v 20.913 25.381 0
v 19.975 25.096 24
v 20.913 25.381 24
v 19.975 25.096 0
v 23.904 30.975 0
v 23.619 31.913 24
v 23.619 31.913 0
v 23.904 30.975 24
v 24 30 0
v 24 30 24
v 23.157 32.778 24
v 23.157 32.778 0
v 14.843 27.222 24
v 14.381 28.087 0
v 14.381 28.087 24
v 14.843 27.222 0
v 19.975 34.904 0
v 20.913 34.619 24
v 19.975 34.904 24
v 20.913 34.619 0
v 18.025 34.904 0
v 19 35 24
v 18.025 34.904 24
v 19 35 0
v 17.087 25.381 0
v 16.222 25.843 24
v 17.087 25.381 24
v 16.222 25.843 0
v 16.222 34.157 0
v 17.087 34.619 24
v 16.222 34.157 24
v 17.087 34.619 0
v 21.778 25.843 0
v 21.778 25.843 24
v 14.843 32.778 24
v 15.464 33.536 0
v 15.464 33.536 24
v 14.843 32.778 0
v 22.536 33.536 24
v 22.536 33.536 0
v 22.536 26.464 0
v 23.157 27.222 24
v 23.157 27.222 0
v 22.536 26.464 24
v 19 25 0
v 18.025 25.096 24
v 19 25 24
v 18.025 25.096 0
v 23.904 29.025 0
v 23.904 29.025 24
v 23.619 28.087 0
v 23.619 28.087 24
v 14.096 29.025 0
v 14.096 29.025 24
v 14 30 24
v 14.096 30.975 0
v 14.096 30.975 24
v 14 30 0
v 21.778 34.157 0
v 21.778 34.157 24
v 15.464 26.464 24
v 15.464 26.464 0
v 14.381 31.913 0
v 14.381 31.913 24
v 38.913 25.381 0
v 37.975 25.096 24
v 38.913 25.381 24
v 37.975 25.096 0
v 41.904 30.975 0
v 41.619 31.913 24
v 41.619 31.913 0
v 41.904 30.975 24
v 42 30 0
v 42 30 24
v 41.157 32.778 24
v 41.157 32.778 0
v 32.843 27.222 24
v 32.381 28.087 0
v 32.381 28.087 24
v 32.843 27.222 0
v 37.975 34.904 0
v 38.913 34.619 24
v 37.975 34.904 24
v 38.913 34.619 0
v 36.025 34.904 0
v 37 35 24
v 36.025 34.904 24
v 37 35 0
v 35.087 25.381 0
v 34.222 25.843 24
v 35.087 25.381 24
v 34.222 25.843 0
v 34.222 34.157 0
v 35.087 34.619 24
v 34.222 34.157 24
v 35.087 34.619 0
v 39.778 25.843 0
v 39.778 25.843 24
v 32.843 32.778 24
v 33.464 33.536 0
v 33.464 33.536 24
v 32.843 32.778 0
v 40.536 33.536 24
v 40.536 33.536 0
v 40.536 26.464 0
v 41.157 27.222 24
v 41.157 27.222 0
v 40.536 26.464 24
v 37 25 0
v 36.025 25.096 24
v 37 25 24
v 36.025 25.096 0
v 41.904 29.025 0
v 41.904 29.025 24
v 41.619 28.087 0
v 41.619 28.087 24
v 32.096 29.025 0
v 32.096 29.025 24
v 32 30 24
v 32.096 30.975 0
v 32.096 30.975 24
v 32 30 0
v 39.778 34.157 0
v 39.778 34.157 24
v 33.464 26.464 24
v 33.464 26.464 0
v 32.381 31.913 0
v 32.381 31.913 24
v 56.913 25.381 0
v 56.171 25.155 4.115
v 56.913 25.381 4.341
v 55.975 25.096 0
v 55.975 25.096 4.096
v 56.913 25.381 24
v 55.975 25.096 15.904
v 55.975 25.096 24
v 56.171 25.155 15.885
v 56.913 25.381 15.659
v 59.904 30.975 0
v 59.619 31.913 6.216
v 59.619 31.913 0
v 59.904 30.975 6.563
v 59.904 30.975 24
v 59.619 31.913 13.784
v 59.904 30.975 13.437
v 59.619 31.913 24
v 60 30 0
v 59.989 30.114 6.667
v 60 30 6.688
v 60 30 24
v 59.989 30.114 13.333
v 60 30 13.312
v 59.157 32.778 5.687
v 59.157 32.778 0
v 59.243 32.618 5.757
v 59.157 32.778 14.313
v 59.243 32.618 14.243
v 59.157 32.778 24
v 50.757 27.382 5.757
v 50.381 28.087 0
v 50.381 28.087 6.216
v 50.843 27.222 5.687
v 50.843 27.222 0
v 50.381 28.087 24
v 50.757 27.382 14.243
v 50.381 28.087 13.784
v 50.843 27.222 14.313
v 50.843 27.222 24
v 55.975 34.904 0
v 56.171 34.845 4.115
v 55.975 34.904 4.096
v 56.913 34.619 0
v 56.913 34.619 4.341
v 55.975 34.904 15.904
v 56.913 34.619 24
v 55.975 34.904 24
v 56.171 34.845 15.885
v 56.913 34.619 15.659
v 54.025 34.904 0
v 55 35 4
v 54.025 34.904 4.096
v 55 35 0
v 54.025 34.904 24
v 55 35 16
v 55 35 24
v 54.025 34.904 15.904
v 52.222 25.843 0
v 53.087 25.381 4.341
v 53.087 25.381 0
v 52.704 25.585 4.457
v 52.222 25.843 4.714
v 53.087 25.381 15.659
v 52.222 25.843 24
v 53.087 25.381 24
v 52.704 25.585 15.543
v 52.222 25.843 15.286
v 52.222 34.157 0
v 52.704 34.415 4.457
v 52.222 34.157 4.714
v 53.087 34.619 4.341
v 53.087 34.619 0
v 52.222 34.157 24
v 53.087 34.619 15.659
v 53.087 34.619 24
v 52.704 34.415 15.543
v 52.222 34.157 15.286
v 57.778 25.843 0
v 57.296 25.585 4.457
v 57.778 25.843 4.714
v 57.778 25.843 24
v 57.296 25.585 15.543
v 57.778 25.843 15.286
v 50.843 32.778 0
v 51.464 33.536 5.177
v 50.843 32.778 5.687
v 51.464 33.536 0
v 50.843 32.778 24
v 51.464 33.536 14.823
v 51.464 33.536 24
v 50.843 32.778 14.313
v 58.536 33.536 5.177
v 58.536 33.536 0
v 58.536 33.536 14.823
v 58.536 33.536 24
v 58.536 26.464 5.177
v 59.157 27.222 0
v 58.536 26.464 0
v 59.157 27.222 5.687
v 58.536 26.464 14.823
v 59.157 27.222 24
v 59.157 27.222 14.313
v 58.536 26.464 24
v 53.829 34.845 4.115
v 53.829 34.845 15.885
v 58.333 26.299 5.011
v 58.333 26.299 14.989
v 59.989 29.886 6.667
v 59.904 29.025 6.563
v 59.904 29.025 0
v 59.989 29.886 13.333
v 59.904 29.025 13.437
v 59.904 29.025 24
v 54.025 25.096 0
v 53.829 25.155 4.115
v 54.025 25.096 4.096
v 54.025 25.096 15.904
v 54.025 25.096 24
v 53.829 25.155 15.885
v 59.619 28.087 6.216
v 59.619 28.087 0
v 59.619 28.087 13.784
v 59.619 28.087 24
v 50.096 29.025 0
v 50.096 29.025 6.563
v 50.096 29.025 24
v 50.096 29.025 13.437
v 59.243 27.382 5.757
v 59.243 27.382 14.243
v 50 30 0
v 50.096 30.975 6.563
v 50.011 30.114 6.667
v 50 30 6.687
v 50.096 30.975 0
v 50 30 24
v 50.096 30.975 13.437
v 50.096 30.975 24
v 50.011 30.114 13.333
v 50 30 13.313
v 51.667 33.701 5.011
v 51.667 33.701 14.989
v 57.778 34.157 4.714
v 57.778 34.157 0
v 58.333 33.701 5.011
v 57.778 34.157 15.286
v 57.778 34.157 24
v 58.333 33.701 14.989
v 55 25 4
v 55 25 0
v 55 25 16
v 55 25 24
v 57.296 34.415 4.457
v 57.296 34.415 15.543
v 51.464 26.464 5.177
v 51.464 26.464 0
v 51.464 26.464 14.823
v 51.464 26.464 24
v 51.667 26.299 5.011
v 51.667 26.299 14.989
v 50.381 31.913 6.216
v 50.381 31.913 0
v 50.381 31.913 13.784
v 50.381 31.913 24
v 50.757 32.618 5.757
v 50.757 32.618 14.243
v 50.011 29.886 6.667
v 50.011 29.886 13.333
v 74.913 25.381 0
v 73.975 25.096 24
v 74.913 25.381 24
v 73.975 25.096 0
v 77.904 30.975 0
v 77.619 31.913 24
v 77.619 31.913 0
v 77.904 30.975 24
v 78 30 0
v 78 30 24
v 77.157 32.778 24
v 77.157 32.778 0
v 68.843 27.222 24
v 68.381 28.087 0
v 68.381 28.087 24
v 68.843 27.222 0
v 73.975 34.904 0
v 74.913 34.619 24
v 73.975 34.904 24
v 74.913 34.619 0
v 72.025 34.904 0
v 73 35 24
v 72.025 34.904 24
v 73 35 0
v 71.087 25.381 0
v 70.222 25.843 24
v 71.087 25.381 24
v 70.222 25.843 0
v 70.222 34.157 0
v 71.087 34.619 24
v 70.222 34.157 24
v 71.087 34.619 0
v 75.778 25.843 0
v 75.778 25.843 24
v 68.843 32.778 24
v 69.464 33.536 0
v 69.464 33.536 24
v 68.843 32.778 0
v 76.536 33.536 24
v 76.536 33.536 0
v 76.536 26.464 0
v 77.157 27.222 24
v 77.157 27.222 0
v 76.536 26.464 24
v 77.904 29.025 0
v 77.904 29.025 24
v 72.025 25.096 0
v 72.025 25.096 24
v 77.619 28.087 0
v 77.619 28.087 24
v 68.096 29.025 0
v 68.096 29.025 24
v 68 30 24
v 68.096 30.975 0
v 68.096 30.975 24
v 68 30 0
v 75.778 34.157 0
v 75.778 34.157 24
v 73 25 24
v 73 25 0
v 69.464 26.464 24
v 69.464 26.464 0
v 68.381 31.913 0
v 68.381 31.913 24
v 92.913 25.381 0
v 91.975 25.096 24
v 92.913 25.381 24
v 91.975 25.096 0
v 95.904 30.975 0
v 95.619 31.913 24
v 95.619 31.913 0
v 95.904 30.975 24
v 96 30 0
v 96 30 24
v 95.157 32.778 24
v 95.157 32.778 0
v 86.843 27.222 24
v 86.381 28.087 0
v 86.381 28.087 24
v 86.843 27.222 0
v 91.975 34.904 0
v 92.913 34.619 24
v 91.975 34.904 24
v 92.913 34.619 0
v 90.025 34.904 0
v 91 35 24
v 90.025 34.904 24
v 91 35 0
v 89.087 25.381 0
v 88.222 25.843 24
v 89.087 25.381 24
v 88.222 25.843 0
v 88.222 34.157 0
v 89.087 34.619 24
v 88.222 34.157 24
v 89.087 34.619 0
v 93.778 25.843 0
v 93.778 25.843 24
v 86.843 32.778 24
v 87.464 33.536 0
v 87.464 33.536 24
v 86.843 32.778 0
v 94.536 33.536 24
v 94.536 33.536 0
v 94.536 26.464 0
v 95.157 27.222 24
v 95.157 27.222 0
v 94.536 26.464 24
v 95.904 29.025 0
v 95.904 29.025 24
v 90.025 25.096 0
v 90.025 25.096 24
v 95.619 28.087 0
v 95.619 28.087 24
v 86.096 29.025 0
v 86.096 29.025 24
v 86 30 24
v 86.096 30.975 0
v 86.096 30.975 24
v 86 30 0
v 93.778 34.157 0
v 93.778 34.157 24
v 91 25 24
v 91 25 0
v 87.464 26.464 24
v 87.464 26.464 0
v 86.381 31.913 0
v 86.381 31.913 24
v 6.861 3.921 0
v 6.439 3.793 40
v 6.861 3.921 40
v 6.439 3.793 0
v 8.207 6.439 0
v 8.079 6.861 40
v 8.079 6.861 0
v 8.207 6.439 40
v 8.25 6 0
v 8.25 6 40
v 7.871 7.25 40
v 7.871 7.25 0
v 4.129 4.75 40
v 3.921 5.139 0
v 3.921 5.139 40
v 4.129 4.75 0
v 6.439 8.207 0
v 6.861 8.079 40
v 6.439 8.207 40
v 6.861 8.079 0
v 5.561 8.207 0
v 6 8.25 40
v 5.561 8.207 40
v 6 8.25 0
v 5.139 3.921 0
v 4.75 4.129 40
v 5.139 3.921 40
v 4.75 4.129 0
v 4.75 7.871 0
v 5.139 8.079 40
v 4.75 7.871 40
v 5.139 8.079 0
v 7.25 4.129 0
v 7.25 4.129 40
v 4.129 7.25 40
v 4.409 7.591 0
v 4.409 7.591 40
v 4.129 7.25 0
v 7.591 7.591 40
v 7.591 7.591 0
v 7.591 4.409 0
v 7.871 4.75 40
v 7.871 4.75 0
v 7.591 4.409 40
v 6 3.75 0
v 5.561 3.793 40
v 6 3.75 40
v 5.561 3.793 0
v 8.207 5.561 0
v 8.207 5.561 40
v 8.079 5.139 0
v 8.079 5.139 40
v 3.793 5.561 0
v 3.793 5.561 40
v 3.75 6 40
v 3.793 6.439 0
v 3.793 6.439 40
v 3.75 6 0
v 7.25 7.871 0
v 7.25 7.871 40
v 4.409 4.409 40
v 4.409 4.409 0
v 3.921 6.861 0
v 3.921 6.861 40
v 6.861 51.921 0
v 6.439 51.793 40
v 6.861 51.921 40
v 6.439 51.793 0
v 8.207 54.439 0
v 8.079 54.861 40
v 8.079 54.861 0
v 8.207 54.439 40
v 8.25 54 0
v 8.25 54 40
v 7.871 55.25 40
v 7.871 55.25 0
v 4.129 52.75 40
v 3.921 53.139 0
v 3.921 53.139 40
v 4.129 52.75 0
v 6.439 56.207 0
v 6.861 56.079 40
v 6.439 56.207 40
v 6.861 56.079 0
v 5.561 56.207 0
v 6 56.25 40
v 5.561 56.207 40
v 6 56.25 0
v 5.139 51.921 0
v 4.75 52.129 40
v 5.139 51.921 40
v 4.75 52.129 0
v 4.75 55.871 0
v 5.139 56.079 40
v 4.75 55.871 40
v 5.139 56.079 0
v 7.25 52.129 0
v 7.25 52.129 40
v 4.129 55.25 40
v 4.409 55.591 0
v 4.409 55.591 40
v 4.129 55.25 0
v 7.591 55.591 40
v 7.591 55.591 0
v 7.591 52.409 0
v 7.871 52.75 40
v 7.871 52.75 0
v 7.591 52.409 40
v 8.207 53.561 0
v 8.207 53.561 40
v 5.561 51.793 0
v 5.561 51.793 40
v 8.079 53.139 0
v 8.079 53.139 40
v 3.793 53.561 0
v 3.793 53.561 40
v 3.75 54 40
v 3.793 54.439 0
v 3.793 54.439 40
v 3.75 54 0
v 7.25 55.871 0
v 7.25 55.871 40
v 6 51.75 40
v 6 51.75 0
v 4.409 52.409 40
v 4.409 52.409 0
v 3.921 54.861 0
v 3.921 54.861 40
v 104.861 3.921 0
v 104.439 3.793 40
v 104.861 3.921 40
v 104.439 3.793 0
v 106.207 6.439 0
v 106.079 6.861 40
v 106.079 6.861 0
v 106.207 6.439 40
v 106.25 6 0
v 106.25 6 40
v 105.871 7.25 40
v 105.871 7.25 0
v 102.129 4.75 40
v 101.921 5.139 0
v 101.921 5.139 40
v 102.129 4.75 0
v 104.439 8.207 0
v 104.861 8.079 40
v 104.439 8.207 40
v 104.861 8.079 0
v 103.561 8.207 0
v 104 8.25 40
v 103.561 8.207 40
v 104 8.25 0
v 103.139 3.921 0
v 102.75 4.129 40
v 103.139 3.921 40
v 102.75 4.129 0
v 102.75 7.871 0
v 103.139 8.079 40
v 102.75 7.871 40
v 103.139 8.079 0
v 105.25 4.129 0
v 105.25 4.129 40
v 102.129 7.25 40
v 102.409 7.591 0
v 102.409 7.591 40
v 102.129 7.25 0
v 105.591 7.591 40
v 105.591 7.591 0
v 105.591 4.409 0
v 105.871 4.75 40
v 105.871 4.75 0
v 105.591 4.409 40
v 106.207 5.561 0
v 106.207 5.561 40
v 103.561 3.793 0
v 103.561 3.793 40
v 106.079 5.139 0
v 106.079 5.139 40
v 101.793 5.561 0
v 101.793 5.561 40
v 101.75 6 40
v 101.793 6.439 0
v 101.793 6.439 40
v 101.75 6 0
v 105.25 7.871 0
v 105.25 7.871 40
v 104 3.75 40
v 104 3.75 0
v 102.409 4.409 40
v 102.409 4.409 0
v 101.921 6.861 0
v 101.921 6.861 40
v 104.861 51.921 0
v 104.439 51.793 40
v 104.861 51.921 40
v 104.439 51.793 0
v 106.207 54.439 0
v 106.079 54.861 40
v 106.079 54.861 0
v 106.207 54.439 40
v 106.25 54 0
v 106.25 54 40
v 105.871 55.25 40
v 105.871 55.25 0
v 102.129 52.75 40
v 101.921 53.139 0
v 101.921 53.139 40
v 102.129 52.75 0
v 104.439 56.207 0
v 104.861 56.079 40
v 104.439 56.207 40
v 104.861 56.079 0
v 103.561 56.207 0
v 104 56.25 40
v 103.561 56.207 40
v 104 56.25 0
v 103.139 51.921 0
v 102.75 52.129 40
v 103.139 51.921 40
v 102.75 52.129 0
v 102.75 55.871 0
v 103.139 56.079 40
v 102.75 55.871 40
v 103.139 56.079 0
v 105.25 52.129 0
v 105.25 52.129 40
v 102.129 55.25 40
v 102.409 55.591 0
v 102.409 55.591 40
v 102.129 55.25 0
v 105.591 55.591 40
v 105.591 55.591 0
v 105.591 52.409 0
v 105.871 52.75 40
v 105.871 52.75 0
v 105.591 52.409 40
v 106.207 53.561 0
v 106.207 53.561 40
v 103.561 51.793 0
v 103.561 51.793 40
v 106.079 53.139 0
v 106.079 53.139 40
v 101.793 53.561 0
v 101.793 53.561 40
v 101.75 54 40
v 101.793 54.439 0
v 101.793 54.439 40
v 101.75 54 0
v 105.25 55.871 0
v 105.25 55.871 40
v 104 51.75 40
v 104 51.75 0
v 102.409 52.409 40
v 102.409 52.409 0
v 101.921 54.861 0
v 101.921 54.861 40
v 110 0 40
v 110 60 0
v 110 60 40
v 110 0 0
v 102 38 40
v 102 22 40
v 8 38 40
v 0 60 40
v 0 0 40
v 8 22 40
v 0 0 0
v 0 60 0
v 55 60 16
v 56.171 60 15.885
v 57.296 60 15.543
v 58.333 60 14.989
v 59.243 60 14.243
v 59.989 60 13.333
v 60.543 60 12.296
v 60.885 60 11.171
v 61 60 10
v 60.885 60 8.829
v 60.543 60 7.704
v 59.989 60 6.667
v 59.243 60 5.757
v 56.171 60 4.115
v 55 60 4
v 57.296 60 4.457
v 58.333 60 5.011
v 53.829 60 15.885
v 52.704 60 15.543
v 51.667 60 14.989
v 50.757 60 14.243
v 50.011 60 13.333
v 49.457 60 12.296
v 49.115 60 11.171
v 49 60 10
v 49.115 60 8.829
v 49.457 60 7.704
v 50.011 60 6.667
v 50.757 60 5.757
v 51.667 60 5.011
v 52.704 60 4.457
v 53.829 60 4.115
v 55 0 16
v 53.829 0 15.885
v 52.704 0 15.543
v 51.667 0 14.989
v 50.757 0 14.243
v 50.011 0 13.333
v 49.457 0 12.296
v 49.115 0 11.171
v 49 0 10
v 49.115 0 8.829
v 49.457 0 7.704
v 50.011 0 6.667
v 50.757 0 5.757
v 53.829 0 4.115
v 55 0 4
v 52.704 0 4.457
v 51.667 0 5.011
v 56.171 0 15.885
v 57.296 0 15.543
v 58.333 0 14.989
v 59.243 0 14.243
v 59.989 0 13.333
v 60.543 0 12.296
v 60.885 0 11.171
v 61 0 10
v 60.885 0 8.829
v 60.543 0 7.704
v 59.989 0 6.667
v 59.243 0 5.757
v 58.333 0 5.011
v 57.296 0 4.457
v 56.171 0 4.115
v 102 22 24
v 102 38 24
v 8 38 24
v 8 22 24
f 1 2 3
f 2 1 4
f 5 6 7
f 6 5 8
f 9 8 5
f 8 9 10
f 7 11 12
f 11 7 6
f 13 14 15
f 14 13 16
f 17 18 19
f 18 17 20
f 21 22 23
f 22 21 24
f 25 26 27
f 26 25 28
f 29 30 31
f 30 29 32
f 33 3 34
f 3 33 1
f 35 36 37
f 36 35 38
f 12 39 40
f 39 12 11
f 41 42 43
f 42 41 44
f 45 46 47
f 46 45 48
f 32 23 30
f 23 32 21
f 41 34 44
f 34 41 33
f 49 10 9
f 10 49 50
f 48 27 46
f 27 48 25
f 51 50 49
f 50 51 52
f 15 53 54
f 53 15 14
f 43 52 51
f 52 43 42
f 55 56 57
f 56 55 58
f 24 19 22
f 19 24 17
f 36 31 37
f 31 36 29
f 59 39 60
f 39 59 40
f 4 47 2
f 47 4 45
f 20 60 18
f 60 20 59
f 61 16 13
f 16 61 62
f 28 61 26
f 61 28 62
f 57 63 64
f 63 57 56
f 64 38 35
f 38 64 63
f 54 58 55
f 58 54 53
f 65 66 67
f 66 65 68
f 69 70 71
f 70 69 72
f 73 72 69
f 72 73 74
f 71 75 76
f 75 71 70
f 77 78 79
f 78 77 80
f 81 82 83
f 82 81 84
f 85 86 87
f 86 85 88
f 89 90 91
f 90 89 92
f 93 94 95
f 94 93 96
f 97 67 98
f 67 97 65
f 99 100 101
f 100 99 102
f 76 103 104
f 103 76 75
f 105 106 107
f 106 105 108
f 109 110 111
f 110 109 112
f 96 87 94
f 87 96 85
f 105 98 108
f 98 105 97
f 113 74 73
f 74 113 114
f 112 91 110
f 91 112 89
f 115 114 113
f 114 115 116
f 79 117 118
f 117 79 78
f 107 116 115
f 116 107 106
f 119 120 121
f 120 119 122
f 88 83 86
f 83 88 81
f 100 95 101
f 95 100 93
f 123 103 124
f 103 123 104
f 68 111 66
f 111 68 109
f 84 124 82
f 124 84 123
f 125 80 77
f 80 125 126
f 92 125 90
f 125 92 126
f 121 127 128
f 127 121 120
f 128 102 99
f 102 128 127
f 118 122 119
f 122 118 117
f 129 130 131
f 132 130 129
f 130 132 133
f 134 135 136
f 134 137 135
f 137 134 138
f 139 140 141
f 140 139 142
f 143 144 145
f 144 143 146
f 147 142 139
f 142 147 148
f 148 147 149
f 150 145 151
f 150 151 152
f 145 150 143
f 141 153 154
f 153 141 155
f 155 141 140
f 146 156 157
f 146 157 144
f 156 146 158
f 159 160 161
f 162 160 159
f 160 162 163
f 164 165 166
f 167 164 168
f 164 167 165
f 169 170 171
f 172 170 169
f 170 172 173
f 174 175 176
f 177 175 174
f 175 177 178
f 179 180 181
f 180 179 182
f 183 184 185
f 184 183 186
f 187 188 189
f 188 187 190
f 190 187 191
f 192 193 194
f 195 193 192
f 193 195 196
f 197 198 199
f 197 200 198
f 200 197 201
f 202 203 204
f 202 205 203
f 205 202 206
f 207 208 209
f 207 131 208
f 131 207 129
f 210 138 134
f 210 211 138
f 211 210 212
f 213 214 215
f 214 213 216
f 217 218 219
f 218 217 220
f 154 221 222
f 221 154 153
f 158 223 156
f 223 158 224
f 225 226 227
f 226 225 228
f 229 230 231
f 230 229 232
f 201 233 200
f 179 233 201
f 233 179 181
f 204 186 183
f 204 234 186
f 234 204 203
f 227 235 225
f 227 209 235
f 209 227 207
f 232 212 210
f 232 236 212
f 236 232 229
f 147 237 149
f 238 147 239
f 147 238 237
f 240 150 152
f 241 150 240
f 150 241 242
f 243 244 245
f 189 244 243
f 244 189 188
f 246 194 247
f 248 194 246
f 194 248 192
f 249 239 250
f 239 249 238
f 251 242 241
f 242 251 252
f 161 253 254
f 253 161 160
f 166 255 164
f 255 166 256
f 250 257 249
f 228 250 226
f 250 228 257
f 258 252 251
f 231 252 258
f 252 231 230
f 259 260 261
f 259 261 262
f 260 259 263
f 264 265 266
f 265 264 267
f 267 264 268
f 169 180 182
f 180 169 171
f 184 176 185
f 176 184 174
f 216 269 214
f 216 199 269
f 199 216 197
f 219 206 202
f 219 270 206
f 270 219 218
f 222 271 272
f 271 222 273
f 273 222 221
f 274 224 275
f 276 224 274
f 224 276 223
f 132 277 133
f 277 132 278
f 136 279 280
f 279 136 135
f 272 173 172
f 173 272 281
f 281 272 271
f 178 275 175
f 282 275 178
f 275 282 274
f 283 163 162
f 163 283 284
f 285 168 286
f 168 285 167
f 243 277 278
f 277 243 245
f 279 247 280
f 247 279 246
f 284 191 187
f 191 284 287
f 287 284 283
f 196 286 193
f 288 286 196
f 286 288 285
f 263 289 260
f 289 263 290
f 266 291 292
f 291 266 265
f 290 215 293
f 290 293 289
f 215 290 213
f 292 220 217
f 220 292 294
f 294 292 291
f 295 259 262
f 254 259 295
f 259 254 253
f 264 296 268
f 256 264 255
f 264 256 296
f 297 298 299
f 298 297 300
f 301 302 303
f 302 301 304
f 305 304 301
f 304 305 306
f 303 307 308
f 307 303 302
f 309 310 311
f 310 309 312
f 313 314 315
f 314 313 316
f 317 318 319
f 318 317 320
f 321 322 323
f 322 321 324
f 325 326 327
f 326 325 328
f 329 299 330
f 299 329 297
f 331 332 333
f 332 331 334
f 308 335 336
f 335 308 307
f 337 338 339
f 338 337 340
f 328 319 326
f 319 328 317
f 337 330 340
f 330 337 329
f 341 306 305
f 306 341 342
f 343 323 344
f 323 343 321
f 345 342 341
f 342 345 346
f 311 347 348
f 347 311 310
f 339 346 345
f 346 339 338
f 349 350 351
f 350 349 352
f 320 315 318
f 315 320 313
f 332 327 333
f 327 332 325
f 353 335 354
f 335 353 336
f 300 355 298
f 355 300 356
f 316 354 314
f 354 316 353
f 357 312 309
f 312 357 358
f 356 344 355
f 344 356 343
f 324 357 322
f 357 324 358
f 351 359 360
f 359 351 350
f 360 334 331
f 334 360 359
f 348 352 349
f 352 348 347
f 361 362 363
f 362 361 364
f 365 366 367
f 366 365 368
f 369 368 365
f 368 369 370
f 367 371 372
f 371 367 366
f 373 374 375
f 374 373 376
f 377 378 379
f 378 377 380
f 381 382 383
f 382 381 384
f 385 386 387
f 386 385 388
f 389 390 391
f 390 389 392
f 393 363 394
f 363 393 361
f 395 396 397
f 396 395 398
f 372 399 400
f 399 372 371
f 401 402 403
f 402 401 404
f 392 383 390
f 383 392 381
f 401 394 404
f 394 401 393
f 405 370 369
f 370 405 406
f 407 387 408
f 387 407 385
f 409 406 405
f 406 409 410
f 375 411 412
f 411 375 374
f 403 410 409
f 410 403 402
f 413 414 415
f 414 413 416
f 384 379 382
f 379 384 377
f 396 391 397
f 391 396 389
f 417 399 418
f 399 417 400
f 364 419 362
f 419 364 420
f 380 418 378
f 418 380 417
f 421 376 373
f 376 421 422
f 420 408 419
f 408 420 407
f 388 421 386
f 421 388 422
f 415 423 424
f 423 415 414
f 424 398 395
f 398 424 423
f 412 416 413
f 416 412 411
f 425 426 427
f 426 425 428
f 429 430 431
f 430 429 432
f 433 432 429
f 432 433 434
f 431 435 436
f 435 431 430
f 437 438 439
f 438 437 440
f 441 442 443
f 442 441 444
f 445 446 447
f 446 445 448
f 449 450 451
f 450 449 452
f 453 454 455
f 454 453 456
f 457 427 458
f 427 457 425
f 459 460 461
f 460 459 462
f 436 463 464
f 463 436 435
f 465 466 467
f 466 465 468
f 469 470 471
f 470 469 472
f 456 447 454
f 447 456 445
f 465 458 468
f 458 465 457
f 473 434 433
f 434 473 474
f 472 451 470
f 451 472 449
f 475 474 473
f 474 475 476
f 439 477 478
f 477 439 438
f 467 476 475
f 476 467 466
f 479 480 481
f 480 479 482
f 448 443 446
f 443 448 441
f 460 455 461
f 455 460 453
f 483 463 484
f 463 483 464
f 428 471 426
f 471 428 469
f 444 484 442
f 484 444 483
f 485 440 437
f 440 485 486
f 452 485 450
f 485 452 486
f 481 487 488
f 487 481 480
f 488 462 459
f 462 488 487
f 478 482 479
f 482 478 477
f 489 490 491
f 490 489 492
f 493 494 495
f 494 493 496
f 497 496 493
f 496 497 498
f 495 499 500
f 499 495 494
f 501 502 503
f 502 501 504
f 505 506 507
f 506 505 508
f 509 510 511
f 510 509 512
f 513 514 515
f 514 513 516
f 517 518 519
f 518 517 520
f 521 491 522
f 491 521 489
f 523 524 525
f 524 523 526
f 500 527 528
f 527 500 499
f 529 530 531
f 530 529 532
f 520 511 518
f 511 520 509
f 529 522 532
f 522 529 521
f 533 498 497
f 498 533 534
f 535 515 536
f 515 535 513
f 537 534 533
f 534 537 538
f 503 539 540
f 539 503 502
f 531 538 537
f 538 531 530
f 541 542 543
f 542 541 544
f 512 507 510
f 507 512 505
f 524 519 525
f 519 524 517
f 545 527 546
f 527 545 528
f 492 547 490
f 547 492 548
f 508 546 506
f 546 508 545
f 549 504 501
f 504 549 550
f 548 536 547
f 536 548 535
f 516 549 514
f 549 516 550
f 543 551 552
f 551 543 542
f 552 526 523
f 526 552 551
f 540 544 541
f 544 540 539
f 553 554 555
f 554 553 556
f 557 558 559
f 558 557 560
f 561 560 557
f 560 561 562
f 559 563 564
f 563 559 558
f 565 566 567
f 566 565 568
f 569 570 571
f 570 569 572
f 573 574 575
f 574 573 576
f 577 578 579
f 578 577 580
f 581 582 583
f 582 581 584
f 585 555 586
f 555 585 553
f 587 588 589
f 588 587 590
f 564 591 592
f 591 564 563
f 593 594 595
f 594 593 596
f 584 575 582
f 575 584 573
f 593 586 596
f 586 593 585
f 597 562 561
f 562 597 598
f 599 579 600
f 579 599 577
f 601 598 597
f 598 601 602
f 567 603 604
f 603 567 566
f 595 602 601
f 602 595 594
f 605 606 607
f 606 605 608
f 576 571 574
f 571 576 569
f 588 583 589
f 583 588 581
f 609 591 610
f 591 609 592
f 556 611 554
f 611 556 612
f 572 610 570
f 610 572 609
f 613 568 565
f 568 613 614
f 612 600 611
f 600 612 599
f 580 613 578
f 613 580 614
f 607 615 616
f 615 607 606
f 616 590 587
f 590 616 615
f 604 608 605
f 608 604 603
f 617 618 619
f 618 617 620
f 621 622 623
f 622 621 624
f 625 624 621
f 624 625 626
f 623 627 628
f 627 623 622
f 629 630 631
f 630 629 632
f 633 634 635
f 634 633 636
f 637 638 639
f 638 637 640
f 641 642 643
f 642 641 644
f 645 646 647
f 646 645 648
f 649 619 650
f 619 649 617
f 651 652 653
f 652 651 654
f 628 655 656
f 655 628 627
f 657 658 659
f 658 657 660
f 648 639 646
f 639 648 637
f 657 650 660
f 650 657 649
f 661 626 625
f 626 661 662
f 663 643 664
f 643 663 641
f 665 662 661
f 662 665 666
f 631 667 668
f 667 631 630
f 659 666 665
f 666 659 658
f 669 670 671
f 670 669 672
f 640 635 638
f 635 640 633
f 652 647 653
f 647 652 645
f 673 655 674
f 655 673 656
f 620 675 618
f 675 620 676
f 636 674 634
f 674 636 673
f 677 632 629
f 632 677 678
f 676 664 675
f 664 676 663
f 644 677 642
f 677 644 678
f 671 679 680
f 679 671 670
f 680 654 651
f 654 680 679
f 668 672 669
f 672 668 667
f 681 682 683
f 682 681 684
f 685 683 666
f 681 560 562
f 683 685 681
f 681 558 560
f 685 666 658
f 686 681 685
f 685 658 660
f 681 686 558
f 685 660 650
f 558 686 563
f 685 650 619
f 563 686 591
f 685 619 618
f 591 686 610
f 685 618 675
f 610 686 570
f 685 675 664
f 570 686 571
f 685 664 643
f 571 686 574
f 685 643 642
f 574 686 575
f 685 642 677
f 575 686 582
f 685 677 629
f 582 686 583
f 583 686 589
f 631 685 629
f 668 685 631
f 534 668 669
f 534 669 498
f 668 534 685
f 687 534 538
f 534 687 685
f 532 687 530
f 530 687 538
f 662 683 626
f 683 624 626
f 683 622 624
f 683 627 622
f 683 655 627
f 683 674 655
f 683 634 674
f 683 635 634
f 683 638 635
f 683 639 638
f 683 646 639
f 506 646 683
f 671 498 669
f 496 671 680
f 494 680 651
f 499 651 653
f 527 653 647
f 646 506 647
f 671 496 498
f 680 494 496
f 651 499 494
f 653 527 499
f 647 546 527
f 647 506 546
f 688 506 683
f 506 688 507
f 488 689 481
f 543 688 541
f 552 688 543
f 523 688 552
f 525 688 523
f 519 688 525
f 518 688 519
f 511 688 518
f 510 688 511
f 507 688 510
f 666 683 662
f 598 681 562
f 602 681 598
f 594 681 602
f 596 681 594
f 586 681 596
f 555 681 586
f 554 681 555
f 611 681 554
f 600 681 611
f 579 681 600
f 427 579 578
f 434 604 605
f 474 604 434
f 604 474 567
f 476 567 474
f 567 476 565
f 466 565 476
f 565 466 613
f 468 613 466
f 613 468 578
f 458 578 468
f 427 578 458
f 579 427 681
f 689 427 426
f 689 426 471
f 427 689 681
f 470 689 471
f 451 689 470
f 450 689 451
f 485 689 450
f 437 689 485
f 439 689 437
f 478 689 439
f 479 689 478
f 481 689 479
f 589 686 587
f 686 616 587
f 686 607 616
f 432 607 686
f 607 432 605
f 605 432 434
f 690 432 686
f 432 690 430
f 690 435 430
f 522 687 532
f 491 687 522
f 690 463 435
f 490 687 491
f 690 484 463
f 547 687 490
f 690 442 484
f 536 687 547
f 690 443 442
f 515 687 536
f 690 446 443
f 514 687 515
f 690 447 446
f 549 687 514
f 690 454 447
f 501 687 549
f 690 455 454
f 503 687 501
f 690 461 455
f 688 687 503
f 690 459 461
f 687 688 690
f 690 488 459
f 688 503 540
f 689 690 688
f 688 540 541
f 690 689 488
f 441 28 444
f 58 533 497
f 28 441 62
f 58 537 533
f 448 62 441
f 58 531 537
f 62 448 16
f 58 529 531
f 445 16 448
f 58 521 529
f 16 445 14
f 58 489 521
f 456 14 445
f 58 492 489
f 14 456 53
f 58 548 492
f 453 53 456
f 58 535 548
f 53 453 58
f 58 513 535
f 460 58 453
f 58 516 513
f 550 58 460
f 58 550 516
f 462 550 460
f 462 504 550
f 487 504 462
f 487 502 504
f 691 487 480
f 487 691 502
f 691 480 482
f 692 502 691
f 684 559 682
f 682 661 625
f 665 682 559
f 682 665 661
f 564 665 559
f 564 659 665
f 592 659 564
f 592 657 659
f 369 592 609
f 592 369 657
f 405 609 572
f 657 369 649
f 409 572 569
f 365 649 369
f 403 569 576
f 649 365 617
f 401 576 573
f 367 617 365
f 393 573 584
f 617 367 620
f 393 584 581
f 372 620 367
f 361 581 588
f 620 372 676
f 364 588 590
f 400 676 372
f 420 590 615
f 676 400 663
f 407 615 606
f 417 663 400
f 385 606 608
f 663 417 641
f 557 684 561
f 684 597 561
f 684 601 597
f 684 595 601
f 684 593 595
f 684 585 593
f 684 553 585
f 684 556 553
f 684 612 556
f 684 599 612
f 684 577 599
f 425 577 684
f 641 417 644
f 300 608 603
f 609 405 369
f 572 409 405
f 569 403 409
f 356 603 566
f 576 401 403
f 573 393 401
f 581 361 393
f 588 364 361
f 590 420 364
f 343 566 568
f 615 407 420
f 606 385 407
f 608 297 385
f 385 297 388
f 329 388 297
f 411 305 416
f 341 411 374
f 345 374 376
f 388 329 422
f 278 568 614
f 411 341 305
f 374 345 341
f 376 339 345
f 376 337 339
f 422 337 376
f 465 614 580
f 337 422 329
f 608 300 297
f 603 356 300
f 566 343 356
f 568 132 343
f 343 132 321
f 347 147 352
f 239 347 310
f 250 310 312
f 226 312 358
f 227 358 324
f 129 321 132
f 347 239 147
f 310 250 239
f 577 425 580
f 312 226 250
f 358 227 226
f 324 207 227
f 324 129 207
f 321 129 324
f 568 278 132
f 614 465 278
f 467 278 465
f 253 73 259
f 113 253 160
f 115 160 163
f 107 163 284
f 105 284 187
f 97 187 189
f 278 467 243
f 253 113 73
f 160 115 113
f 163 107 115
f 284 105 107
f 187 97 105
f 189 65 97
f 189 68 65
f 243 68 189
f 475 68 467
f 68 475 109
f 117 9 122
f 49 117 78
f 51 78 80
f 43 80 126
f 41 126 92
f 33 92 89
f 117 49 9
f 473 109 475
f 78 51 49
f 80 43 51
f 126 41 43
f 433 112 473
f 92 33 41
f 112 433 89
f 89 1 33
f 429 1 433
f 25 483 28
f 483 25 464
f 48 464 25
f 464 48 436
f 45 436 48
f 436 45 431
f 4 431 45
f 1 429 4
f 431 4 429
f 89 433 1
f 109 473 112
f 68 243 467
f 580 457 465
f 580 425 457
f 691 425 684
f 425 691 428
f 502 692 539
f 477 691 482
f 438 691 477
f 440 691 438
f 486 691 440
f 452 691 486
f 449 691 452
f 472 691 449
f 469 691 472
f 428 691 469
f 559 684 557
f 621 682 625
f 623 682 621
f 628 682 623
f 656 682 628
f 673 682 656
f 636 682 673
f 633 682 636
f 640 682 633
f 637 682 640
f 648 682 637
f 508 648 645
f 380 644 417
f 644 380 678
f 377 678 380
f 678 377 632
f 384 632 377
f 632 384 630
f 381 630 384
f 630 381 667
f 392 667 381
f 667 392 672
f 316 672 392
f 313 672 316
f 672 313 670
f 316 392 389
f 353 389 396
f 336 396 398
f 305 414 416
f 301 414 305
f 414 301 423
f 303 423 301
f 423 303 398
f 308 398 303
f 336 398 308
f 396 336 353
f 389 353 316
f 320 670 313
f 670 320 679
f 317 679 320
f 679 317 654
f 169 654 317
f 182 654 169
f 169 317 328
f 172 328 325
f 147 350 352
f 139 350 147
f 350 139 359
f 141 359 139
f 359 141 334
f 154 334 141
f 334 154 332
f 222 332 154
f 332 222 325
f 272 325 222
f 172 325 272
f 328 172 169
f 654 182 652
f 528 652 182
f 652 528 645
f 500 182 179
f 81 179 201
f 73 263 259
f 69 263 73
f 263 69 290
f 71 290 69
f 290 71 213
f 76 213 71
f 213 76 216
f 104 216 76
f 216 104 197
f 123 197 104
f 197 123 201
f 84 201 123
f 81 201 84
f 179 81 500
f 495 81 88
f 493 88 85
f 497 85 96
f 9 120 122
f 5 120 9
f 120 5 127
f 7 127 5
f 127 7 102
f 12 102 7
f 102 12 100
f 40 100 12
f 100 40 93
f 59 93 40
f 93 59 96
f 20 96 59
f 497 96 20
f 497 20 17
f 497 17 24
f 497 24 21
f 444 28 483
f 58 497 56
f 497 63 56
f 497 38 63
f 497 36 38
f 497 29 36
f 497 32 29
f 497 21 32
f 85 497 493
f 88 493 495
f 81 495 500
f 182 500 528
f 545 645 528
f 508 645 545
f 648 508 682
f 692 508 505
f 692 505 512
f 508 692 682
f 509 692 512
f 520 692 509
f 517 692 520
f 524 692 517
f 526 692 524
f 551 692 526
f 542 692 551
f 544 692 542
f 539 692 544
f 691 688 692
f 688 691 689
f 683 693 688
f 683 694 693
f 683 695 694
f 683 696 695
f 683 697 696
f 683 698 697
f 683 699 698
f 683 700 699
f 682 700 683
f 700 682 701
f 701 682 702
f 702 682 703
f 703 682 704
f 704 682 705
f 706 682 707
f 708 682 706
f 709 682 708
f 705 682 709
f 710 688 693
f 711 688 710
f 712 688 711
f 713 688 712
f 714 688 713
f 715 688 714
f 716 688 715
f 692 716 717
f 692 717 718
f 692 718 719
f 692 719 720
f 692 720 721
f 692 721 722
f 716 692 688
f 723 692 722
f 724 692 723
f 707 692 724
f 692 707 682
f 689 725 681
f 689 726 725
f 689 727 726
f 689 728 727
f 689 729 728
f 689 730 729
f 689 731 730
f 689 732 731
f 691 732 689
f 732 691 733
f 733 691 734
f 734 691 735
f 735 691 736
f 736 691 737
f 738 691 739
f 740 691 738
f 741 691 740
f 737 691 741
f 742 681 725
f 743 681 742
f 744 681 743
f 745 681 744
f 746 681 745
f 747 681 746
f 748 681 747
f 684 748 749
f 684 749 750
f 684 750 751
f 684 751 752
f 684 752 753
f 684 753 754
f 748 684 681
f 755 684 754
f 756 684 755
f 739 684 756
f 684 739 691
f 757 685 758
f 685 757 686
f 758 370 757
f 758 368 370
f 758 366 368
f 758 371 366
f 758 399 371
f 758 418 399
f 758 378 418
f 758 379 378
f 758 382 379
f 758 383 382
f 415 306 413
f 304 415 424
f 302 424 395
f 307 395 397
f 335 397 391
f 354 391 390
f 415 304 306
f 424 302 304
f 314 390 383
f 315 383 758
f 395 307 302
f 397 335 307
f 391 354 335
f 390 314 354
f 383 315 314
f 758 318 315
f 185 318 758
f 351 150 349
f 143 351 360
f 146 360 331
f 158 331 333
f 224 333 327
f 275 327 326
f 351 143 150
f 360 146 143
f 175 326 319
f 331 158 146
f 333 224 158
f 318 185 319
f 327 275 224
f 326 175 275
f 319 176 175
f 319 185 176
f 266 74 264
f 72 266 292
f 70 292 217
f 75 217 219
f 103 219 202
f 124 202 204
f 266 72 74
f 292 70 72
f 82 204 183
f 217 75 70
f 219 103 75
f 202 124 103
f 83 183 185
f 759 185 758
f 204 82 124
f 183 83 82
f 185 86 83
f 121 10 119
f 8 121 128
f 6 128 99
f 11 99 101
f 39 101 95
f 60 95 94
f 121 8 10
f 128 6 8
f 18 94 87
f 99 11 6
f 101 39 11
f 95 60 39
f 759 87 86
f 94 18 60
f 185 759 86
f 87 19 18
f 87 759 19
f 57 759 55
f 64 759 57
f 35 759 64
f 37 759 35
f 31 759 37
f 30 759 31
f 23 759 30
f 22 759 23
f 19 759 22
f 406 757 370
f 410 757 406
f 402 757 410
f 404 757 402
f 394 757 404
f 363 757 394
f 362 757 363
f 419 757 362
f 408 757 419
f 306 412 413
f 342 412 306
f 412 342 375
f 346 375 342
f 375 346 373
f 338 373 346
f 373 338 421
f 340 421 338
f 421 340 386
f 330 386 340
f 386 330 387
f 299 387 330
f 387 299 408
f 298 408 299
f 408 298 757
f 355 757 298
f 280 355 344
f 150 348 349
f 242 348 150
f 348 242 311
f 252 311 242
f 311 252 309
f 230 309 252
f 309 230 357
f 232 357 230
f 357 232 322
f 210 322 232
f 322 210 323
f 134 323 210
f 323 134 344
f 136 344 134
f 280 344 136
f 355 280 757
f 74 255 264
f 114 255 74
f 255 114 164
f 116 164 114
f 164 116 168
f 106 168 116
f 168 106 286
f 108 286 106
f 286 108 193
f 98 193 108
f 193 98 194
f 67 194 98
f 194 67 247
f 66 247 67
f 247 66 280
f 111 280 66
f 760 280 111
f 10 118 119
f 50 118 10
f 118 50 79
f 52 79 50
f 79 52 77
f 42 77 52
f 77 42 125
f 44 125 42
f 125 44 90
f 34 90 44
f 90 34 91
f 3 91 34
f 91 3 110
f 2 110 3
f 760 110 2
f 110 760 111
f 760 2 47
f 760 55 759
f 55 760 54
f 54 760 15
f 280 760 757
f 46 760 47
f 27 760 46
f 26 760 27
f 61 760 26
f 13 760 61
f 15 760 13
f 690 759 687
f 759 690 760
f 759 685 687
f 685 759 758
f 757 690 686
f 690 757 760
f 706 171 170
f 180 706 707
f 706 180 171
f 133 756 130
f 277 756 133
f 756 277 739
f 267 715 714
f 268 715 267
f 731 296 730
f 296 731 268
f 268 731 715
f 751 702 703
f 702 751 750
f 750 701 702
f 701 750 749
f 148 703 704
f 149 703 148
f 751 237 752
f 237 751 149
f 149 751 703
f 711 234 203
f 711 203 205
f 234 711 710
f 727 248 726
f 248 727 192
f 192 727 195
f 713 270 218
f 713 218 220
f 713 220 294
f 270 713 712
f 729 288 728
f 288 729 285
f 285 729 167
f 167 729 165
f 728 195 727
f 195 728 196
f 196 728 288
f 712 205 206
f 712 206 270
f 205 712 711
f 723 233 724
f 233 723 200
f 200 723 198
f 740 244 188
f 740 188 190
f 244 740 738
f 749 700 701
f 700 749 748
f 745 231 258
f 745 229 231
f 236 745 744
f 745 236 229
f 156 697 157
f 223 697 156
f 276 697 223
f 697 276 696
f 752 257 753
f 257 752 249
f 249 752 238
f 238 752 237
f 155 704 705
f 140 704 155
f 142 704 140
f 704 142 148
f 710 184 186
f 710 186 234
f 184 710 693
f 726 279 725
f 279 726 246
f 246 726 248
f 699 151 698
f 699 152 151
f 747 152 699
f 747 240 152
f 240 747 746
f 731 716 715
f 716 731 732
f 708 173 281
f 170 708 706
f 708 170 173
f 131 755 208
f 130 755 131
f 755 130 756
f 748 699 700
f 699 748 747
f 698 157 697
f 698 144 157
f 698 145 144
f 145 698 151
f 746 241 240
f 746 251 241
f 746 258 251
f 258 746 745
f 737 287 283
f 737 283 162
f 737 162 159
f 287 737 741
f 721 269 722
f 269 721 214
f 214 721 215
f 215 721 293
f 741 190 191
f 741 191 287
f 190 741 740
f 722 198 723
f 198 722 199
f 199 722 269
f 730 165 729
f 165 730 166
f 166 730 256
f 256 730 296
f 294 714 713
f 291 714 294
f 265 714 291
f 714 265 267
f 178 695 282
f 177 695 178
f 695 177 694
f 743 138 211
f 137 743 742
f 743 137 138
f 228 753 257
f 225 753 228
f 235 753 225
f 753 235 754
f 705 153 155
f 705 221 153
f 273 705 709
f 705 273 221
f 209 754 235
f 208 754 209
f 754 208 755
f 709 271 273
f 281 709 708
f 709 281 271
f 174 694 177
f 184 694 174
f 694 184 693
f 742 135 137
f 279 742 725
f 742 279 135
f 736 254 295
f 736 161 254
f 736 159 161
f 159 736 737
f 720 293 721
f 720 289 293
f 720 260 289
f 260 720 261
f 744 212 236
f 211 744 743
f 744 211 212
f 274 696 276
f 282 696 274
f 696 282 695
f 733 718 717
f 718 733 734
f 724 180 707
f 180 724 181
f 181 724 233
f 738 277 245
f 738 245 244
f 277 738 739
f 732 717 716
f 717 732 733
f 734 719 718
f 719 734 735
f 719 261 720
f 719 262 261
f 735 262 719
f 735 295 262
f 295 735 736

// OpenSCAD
$fn = 32;

// ----------------------------------------------------------------------
// Manifold block: side_outlet manifold
// ----------------------------------------------------------------------

// --- parameters (mm) ---
block_l = 110;            // block length, X
block_w = 60;             // block width, Y
block_h = 40;             // block height, Z
port_d = 10;              // port bore diameter
port_pitch = 18;          // port pitch along X
gallery_d = 16;           // top gallery width, Y
gallery_depth = 16;       // gallery pocket depth
wall_p = 8;               // gallery end wall thickness, X
mnt_d = 4.5;              // mounting hole diameter
mnt_in = 6;               // mounting hole inset from the edges
out_d = 12;               // outlet bore diameter
out_z = 10;               // outlet axis height

n_ports = 5;  // ports in the row
port_x0 = (block_l - (n_ports - 1) * port_pitch) / 2;  // first port X

difference() {
  cube([block_l, block_w, block_h]);
  for (i = [0 : n_ports - 1])
    translate([port_x0 + i * port_pitch, block_w / 2, -1])
      cylinder(h = block_h + 2, d = port_d);
  translate([wall_p, block_w / 2 - gallery_d / 2, block_h - gallery_depth])
    cube([block_l - 2 * wall_p, gallery_d, gallery_depth + 1]);
  for (cx = [mnt_in, block_l - mnt_in])
    for (cy = [mnt_in, block_w - mnt_in])
      translate([cx, cy, -1]) cylinder(h = block_h + 2, d = mnt_d);
  translate([block_l / 2, -1, out_z]) rotate([-90, 0, 0])
    cylinder(h = block_w + 2, d = out_d);
}
